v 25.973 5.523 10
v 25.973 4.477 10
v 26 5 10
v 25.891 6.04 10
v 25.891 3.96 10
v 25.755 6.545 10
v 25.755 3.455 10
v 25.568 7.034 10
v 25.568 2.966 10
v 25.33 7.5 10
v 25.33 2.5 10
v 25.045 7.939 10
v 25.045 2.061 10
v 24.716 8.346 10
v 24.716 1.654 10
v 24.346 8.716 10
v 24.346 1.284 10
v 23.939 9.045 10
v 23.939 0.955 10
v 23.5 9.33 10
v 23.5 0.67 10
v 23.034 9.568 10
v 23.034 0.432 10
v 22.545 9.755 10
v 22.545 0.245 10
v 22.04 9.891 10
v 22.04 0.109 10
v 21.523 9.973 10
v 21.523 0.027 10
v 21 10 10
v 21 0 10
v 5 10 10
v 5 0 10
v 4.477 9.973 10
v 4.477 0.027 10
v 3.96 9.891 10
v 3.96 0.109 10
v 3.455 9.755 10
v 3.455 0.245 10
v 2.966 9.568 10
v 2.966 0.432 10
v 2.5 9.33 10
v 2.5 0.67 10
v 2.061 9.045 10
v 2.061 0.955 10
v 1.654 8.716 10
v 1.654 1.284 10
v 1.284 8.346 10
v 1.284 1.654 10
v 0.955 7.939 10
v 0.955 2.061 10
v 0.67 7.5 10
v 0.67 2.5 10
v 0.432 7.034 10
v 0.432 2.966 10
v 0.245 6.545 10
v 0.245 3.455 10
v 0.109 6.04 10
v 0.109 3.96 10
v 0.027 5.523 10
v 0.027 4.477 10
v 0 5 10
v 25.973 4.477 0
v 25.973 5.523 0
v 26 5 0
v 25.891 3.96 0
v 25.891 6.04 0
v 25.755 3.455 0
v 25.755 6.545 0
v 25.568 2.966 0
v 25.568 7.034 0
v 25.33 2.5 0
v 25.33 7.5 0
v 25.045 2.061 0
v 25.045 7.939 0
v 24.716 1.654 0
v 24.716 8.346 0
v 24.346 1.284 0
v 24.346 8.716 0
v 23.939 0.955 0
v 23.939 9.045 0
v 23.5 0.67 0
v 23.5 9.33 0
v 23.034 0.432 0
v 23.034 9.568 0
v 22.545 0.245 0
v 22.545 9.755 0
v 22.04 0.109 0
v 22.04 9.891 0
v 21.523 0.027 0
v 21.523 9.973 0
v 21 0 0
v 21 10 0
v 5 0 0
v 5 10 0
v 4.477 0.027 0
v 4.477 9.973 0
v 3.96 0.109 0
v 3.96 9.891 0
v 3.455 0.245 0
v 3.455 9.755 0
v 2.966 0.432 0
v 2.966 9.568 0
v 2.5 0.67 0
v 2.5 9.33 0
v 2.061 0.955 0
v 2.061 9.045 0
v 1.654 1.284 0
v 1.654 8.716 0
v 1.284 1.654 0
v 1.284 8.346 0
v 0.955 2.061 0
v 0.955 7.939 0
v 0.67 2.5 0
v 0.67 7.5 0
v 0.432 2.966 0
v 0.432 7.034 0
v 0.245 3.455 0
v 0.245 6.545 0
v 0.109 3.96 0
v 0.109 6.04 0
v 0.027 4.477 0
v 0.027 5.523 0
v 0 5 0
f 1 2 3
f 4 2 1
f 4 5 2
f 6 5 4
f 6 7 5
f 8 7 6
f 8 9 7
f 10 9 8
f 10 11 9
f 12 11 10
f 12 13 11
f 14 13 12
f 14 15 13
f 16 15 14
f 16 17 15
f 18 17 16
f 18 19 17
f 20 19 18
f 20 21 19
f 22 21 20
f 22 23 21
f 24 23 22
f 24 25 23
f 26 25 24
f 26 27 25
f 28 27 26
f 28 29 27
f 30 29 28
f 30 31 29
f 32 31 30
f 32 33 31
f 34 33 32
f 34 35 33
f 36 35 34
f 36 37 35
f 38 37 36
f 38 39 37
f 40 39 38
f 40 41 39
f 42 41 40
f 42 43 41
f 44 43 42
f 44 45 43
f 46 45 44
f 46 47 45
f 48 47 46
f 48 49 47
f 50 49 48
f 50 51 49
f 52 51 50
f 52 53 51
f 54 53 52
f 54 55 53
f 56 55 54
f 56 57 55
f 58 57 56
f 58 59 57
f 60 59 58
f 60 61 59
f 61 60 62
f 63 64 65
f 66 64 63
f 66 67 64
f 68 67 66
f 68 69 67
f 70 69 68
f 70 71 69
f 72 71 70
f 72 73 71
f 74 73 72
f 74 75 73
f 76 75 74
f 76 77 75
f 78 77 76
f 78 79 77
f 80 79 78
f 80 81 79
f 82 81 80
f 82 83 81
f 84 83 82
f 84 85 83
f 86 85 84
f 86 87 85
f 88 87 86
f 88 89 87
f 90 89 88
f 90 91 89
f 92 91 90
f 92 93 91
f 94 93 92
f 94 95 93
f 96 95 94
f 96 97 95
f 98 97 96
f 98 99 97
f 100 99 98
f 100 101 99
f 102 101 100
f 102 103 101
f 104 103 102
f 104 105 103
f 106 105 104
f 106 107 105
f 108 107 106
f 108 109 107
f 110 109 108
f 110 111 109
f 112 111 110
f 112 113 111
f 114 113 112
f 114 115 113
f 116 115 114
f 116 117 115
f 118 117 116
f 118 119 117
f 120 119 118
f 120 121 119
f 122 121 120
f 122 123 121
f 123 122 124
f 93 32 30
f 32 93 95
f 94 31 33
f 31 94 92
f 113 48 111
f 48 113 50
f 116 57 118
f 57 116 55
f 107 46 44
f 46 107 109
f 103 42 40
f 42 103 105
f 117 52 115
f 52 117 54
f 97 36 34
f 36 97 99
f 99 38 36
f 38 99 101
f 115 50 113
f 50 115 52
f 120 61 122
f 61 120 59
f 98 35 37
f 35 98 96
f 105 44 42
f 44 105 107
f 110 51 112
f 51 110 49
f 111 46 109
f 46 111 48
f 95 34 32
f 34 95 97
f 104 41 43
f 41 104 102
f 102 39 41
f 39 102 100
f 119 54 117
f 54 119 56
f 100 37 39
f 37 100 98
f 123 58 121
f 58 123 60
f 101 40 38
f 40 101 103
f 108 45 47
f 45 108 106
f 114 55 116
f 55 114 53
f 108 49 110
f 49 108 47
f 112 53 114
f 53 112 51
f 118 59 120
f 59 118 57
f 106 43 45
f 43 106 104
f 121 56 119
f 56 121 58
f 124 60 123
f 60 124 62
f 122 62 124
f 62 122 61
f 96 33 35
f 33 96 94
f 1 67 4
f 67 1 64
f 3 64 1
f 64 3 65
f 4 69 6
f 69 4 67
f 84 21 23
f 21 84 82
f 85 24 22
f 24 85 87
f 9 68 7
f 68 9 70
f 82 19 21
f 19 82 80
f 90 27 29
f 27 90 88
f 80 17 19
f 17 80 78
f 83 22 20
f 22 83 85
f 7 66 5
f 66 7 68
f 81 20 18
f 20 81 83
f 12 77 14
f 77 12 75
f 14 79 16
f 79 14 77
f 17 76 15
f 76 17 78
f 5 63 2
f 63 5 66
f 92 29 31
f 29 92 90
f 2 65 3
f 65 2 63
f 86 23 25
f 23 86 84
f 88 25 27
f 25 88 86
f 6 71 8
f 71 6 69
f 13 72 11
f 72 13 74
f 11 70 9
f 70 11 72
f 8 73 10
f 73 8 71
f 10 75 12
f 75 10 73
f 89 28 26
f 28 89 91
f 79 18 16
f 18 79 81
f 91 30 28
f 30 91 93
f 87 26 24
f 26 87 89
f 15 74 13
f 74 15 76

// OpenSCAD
height = 10; // Rise height
magnet_length=26.0; // Customize magnet length 
magnet_width=10.0; // Customize magnet width

$fn = 60; // Quality

module round_cube(l, w, h) {
    r = w/2;
    union() {
        cube([l-r*2, w, h]);
        translate([0, r, 0]) 
            cylinder(h=h, r=r, center=false);
        translate([l-r*2, r, 0]) 
            cylinder(h=h, r=r, center=false);
    }
}

//difference() {
//    round_cube(l=magnet_length+Walls*2, w=magnet_width + Walls*2, h=Height+Walls);
    translate([magnet_width/2, 0, 0])
        round_cube(l=magnet_length, w=magnet_width, h=height);
//}
    
